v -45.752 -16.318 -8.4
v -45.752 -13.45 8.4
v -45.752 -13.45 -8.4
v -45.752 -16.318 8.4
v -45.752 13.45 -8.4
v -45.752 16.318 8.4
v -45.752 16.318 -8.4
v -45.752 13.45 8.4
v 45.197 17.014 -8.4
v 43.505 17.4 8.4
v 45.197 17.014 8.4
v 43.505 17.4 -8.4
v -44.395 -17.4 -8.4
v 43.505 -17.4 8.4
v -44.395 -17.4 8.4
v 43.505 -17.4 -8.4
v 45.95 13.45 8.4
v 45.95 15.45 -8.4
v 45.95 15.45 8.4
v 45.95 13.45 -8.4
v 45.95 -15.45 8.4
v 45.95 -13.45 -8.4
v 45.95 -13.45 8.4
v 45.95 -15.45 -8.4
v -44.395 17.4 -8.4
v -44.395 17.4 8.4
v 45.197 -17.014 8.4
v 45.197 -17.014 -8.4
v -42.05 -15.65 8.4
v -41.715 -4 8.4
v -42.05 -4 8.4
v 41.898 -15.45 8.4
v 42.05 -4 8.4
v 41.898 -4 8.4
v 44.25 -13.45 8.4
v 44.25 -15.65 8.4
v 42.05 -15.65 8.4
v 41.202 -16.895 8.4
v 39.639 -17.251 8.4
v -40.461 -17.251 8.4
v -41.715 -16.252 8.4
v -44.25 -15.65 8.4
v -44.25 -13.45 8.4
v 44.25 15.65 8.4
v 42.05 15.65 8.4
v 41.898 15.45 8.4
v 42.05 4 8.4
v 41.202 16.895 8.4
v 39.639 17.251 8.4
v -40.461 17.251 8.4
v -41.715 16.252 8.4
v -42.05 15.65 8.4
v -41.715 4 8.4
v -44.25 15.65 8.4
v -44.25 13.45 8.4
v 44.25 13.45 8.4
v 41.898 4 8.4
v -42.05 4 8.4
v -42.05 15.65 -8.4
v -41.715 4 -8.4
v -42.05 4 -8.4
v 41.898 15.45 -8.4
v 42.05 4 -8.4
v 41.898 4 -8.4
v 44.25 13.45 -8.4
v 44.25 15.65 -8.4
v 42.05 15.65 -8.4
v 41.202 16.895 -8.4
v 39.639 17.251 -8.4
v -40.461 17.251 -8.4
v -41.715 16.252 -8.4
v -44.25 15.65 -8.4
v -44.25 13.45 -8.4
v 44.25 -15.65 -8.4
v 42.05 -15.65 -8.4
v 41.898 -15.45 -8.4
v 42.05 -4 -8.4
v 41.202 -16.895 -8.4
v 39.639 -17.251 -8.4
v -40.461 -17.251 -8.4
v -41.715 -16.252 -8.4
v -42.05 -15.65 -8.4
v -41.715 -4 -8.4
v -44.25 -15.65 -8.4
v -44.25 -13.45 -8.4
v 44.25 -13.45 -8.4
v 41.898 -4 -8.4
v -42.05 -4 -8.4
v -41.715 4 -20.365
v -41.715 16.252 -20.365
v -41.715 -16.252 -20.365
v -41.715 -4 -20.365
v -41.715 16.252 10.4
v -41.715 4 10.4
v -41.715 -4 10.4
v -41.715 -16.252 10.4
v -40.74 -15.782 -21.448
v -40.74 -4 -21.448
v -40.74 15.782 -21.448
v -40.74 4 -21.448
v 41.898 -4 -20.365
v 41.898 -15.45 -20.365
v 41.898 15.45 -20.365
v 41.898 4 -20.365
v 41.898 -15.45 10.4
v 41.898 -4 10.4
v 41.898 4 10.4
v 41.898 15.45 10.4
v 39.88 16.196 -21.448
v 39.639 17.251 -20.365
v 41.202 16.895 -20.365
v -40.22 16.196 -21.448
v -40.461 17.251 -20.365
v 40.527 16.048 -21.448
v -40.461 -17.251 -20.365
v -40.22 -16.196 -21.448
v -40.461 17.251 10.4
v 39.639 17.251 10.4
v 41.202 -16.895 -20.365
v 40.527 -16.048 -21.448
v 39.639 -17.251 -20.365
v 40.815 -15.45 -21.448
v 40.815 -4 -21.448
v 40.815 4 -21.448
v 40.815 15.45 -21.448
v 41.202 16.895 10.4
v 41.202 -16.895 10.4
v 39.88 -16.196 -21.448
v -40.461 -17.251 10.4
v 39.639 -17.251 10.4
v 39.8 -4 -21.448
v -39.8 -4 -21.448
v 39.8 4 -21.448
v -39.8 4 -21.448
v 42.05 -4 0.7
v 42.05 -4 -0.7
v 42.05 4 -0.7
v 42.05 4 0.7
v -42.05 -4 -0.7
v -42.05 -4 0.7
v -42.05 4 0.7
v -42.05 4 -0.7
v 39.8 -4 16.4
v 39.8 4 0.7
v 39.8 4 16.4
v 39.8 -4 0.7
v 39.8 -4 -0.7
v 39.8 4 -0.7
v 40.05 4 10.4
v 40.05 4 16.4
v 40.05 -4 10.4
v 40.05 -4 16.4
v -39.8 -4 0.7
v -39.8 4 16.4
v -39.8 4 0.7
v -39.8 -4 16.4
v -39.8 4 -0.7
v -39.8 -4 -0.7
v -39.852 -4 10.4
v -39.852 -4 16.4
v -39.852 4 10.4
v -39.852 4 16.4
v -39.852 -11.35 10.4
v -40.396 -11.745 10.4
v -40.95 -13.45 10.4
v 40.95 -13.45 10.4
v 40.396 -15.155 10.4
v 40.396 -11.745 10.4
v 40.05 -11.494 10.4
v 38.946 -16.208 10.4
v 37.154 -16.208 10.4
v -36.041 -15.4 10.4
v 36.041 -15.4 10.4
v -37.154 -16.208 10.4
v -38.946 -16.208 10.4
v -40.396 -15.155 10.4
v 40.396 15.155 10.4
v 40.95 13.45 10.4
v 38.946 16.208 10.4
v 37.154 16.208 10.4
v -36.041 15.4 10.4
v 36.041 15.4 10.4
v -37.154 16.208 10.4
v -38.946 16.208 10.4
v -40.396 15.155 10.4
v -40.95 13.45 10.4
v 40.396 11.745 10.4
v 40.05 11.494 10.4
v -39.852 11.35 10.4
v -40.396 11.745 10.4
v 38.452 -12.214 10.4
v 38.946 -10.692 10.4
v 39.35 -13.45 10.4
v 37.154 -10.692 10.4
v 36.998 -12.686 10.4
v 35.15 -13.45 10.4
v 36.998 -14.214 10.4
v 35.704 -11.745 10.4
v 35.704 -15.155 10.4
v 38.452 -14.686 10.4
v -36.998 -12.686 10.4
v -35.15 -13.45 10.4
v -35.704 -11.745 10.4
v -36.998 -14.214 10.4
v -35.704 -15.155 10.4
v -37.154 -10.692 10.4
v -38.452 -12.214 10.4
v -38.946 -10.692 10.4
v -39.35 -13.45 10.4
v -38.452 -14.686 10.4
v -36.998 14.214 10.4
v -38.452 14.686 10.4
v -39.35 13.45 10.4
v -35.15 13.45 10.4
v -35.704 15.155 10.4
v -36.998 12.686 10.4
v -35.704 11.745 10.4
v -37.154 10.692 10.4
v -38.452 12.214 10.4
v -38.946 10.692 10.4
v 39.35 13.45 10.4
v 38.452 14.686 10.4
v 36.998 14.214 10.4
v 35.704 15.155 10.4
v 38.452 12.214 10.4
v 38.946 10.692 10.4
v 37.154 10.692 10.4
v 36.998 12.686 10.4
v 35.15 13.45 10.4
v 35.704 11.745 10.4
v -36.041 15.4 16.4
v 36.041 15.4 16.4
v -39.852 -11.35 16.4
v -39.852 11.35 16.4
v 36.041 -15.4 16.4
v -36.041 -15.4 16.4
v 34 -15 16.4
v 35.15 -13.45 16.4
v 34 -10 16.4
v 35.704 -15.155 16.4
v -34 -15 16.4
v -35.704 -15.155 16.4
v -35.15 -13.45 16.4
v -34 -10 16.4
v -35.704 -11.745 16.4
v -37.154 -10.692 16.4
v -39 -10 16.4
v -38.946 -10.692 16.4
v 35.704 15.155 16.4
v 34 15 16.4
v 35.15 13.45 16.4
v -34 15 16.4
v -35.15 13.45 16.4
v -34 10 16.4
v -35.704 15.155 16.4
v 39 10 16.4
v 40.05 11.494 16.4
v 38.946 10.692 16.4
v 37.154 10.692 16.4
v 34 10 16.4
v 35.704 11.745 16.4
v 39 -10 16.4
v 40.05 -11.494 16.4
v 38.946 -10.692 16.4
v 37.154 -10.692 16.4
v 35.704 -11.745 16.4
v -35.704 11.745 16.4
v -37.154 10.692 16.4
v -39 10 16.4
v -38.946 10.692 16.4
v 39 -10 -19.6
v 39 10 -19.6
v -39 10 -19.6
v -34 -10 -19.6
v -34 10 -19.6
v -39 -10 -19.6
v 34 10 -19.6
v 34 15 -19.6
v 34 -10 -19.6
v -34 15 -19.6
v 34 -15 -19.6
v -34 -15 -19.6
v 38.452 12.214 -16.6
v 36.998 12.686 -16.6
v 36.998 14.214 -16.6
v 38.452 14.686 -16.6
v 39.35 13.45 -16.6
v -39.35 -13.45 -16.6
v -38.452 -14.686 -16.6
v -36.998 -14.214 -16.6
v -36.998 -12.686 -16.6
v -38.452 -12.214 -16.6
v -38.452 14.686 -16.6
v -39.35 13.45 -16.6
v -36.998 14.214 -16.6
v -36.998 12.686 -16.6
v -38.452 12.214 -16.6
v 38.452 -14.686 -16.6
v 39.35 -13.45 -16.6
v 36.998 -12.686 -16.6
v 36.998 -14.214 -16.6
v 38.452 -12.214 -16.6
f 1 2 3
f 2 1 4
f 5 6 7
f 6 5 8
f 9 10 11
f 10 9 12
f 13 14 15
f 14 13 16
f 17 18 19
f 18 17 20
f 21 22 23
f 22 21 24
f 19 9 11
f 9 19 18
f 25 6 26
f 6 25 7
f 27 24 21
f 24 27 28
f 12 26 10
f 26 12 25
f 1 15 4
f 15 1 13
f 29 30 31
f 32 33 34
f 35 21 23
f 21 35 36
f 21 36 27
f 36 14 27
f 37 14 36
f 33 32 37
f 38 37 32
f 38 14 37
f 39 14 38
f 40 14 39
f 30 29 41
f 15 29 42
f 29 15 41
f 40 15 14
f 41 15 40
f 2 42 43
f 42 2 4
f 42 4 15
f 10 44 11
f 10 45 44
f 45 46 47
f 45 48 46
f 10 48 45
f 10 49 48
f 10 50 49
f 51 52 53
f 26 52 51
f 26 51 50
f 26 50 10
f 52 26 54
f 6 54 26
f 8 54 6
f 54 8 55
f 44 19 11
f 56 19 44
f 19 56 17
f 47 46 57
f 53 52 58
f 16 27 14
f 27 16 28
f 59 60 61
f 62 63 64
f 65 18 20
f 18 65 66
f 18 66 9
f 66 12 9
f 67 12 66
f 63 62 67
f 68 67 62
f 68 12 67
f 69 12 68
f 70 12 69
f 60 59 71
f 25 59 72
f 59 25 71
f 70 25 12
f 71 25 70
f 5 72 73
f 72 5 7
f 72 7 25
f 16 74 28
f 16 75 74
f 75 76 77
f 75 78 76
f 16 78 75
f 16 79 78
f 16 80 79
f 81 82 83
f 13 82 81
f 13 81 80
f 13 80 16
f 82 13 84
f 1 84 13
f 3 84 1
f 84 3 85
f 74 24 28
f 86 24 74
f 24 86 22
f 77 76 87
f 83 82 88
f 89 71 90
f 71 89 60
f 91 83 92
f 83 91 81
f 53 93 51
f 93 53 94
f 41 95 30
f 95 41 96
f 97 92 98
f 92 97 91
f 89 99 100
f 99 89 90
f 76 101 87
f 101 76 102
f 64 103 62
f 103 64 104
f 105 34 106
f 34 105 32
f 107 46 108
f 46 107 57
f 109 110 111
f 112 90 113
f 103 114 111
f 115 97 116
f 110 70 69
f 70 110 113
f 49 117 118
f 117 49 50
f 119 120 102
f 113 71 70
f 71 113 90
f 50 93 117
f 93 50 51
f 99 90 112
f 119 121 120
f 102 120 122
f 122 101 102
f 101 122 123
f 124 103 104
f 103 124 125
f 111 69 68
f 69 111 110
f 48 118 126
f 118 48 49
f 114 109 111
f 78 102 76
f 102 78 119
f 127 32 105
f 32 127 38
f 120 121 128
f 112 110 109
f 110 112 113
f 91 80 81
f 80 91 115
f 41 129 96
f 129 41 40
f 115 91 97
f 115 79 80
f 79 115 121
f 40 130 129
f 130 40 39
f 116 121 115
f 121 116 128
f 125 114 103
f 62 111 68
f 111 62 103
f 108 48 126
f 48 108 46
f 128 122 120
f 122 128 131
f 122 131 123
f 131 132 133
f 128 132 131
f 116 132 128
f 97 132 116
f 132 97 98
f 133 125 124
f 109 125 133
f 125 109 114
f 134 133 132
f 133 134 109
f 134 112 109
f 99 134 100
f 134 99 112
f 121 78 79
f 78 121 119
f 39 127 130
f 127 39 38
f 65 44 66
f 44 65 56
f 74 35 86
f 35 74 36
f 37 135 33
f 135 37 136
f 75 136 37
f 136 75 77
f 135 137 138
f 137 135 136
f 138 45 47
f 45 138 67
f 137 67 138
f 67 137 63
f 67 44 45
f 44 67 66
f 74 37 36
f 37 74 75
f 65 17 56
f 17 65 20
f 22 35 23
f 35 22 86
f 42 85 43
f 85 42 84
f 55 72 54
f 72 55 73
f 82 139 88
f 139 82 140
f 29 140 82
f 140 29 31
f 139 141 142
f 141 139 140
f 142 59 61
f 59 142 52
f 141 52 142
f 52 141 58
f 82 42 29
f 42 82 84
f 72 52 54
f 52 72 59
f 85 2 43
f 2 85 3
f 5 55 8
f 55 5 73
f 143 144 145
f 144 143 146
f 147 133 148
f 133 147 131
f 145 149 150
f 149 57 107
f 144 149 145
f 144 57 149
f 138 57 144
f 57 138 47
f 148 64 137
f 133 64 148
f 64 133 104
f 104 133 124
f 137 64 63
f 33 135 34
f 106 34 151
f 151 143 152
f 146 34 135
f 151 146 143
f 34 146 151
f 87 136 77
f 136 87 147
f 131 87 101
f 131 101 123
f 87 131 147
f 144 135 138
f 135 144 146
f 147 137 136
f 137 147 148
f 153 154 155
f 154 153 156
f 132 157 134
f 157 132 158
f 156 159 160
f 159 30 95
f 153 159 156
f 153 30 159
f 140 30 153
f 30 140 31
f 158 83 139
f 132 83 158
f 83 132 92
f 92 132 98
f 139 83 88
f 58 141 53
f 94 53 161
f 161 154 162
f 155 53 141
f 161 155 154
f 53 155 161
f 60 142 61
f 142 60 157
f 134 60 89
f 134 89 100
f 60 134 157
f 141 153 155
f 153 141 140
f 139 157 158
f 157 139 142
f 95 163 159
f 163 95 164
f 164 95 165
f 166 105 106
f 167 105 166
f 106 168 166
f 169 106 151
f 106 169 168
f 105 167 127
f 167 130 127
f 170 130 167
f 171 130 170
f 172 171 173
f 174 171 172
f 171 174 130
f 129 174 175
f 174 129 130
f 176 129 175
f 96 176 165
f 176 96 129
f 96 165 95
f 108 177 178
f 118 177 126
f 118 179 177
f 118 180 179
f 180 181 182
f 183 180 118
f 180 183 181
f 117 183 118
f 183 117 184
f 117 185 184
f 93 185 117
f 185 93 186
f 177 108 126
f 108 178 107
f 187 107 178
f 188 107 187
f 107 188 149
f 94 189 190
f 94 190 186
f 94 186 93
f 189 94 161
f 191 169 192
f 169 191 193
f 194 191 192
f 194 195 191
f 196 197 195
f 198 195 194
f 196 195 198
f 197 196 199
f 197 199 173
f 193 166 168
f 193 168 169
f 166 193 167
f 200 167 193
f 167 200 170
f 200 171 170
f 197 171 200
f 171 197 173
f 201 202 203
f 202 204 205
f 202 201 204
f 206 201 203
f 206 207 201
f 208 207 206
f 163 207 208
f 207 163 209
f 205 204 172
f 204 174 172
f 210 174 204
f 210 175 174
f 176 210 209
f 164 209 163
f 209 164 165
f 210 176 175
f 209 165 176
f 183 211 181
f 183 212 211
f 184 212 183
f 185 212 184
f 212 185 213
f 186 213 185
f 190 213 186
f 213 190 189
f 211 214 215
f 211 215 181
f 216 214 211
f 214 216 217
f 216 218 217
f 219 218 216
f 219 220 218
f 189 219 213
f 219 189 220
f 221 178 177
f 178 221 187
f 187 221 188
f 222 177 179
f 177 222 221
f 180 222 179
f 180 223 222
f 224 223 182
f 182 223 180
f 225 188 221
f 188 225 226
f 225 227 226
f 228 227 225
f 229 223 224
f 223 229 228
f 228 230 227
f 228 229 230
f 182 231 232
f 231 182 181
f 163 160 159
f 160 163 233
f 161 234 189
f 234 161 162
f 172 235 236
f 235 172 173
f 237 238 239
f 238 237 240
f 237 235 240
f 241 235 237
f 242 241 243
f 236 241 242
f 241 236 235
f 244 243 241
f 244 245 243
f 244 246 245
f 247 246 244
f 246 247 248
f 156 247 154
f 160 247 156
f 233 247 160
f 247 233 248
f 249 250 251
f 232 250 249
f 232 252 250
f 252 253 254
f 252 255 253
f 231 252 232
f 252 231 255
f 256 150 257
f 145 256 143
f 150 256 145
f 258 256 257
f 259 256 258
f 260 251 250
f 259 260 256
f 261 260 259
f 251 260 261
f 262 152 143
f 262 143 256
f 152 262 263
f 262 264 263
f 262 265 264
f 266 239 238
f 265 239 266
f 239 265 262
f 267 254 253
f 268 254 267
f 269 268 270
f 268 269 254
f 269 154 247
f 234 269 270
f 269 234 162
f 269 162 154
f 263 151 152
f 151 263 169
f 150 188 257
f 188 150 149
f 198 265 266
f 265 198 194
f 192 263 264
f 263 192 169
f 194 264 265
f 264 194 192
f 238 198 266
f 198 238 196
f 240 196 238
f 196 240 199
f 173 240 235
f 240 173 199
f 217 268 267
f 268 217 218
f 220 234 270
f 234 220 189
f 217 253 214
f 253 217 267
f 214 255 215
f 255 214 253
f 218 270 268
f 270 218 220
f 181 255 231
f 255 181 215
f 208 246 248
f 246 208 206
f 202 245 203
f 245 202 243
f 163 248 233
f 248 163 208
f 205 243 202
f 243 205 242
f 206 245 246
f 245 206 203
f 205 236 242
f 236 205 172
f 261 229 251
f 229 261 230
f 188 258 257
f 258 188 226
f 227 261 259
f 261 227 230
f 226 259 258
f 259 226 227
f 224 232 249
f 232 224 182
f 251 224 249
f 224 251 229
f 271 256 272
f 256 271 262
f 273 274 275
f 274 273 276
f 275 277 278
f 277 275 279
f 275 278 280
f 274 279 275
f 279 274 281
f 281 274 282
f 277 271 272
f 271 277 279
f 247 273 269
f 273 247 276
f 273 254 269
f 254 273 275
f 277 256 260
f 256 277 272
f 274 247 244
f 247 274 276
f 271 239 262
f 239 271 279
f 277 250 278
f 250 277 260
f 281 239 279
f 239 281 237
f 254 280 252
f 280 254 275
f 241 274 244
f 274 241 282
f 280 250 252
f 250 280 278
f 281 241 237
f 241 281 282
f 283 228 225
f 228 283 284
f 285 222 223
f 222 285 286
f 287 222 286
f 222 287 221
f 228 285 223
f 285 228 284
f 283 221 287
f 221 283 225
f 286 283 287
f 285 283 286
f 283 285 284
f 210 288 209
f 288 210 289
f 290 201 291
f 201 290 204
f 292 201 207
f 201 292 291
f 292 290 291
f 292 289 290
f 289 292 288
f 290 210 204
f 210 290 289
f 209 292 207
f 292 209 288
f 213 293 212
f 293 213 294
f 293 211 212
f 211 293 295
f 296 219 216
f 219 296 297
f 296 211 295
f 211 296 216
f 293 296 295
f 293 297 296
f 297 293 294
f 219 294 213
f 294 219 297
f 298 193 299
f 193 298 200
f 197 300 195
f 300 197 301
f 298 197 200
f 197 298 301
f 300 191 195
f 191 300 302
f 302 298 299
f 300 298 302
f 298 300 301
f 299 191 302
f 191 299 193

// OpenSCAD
/*********************************************************************
 *                                                                   *
 *                     Auto-Electrical Modules                       *
 *                     =======================                       *
 *                                                                   *
 * Author: Steve Morgan                                              *
 * Project Source: https://github.com/smorgo/Auto-Electrical-Modules *
 *                                                                   *
 * License: Creative Commons - Attribution - Non Commercial          *
 *                                                                   *
 * 3D printable designs for a suite of modular components to create  *
 * auto-electrical installations.                                    *
 *                                                                   *
 * The printable components in this project are intended to be       *
 * compatible with the MTA Modular Fuse Holder System                *
* (http://www.mta.it/en/frames-modules). The MTA Modular Fuse Holder *
* System is available in the UK from such vendors as 12VoltPlanet    *
* and Polevolt.                                                      *
*                                                                    *
* For more detailed information, see the GitHub project (link above).*
*                                                                    *
**********************************************************************

// Quality setting. You might want to temporarily reduce this for testing
$fn = 30; 

/* This file can be used to generate a number of different components.
 * Set the switches to true or false to control which are generated 
 * and which are not. I recommend that, for generating an STL, you
 * only have one set to true at a time, as they aren't guaranteed
 * to lie in the same vertical plane, making printing difficult,
 * if not impossible. */
 
 /* [Select Demo mode or Printable Parts] */
 // Set to true to see an 'assembly' of parts
demo = 0; // [0:false, 1:true]

/* [Parts to Generate] */
// Set to true to generate an enclosure lid
make_lid = 0; // [0:false, 1:true]             
// Set to true to generate an enclosure (without the lid)
make_body = 1; // [0:false, 1:true]
// Set to true to generate a mounting bracket (set number_of_ways, too)
make_mount = 0; // [0:false, 1:true]           
// Number of 'modules' wide to make the mounting bracket (when make_mount=true)
number_of_ways = 3;           
// Set to true to generate a locking piece for the mounting brackets
make_lock = 0; // [0:false, 1:true]            
// Set to true to generate a spacer that fits under an MTA 2-way bracket to allow surface mounting. Note that brackets made using make_mount=true don't need this spacer
make_standoff = 0; // [0:false, 1:true]
// Set to true to generate a PCB holder. Note that this is specific to my application. You'll want to modify the pcb_insert() module to make your own
make_insert = 0; // [0:false, 1:true]
// Puts a row of four holes in an enclosure. Specific to my application
include_wire_holes = 0; // [0:false, 1:true]

// Some commonly used settings
// Sets the overall height of the enclosure (when make_body=true)
module_height = 40;           
// How much space to allow under the enclosure (with the generated brackets. Adjust for the MTA ones)
module_under_clearance = 2;   
// Depth of the enclosure lid (when make_body=true or make_lid=true)
lid_depth = 9;                
// Overall height of the standoff (when make_standoff=true). Add 2mm to the amount you want to raise the MTA bracket
standoff_height = 12;         

/*===============================================================*/

/*************************************************************
 *                                                           *
 * Some useful notes                                         *
 *                                                           *
 * The enclosure and lid are designed to use M2 countersunk  *
 * machine screws for fixing and M2 heat inserts in the body *
 * of the enclosure, inserted with a hot soldering iron.     *
 * If you want to do something different, you may need to    *
 * change some of the screw-related settings.                *
 *                                                           *
 *************************************************************/
body_screw_diameter = 2.6; // Hole in the enclosure for the heat insert. This should probably be a bit bigger, but it's worked for me.
lid_screw_diameter = 2.2; // Allow a little clearance.
lid_screw_head_diameter = 3.6;
lid_screw_head_depth = 2;
lid_screw_recess = 0.5;

/* You probably don't need to change these settings, as they're tested for compatibility with
 * the MTA modular system. */
/* [Hidden] */
module_width = 34.9;
module_inner_length = 84.1;
module_outer_length = 91.9;
module_radius = 2;
slide_depth = 16.8;
slide_notch_thickness = 2.2;
slide_notch_wall_width = 1.8;
slide_radius = 2;
slide_width = 4;
lock_channel_width = 8;
lock_height = 8.4; // relative to slide
lock_thickness = 1.4;
lock_depth = 2.2;
lid_clearance = 1;
lid_wall_thickness = 2;
lid_inner_radius = 2;
internal_width = 30;
internal_length = 78;
mount_width = 39.6;
mount_height = 32;
mount_length = 10;
mount_radius = 3;
mount_wall_thickness = 2;
mount_clip_body_width = 24.4;
mount_clip_body_thickness = 2.1;
mount_clip_front_width = 30.8;
mount_clip_front_thickness = 1.6;
mount_slot_width = 10.4;
fixing_outer_diameter = 10;
fixing_inner_diameter = 4;
fixing_depth = 4;

module_z_offset = (mount_height - module_height)/-2 + (slide_depth - mount_height)/2 + module_under_clearance;
lid_z_offset = (module_z_offset + module_height/2 - lid_depth);

if(demo) {
    demo(2);
} else {
    main();
}

module demo(num=3) {
    make_boxes(num);
    make_mounts(num);
    make_locks(num);
    make_standoffs();
    translate([0,(num-1) * (mount_width - mount_wall_thickness),0]) {
        rotate([0,0,180]) {
            make_mounts(num);
            make_locks(num);
        }
        translate([0,0,-10]) {
            pcb_insert(true);
        }
    }
}

module main() {

    if(make_body) {
        body();
    }
    
    if(make_lid) {
        translate([0,80,0]) {
            difference() {
                lid();
                lid_screws();
            }
        }
    }

    if(make_mount) {
        translate([80,0,0]) {
            difference() {
                for(i=[0:number_of_ways -1]) {
                    translate([0,i * (mount_width - mount_wall_thickness),0]) {
                        mount();
                    }
                }
                if(number_of_ways > 1) {
                    for(i=[1:number_of_ways -1]) {
                        translate([-6,(i - 0.5) * (mount_width - mount_wall_thickness),0]) {
                            cube([4,mount_wall_thickness + 1,mount_height +1], center=true);
                        }
                    }
                }
            }
            mount_fixings();
        }
    }

    if(make_lock) {
        translate([-50,-100,0]) {
            rotate([90,0,0]) slide_lock();
        }
    }
    
    if(make_insert) {
        translate([20,-50,-20]) {
            pcb_insert();
        }
    }
    
    if(make_standoff) {
        translate([120,0,0]) {
            standoff();
        }
    }
}

/************************************************
 *                                              *
 * The implementations. In general, don't mess  *
 * with these (with the exception of pcb_insert *
 * and wire_holes, if you need to).             *
 *                                              *
 ************************************************/
module body() {

    difference() {
        union() {
            roundedcube([module_outer_length, module_width, slide_depth], center=true, radius=slide_radius, apply_to="z");
            translate([0,0,module_z_offset]) {
                roundedcube([module_inner_length, module_width, module_height], center=true, radius=module_radius);
            }
        }
        slots();
        locks();
        translate([0,0,module_height/2 + module_z_offset]) rotate([180,0,0]) lid(depth = lid_depth-lid_clearance,clearance = 0.2);
        translate([0,0,lid_wall_thickness + module_z_offset]) {
            cube([internal_length, internal_width - 10, module_height], center=true);
            cube([internal_length - 10, internal_width, module_height], center=true);
        }
        body_screws();
        if(include_wire_holes) {
            wire_holes();
        }
    }
}

module body_screw() {
    translate([module_inner_length/2 - 4, module_width/2 - 4,(lid_depth+lid_clearance)/2+module_z_offset]) {
        cylinder(h = module_height, d = body_screw_diameter, center=true);
    }
}

module body_screws() {
    body_screw();
    rotate([0,0,180]) body_screw();
    mirror([1,0,0]) body_screw();
    mirror([1,0,0]) rotate([0,0,180]) body_screw();
}

module lid(depth = lid_depth, clearance = 0) {
    
    mirror([0,0,1]) {
        translate([0,0,-module_height/2]) {
            difference() {
                translate([0,0,clearance/2]) {
                    roundedcube([module_inner_length + clearance, module_width + clearance, module_height + clearance], center=true, radius=slide_radius);
                }
                translate([0,0,-depth]) {
                    cube([module_inner_length+1, module_width+1, module_height], center=true);
                }
                translate([0,0,-lid_wall_thickness]) {
                    roundedcube([module_inner_length - 2 * lid_wall_thickness, module_width - 2 * lid_wall_thickness, module_height], center=true, radius=lid_inner_radius, apply_to="z");
                }
            }
        }
        lid_posts(depth,clearance);
    }
}

module lid_post(depth,clearance) {
    translate([module_inner_length/2 - 4, module_width/2 - 4,-depth/2]) {
        cylinder(h = depth, d = 6 - clearance, center=true);
    }
}

module lid_posts(depth,clearance) {
    lid_post(depth,clearance);
    rotate([0,0,180]) lid_post(depth,clearance);
    mirror([1,0,0]) lid_post(depth,clearance);
    mirror([1,0,0]) rotate([0,0,180]) lid_post(depth,clearance);
}

module lid_screw() {
    translate([module_inner_length/2 - 4, module_width/2 - 4, -0.6]) {
        mirror([0,0,1]) {
            screw_countersunk(l = lid_depth+0.2,dh=lid_screw_head_diameter,lh=lid_screw_head_depth,ds=lid_screw_diameter,recess=lid_screw_recess);
        }
    }
}

module lid_screws() {
    lid_screw();
    rotate([0,0,180]) lid_screw();
    mirror([1,0,0]) lid_screw();
    mirror([1,0,0]) rotate([0,0,180]) lid_screw();
}

module lock() {
    translate([(module_inner_length - lock_depth)/2,0,0]) {
        difference() {
            translate([0,0,module_z_offset]) cube([lock_depth + 0.1,lock_channel_width, module_height+1], center=true);
            cube([lock_depth + 0.1, lock_channel_width + 0.1, lock_thickness], center=true);
        }
    }
}

module locks() {
    lock();
    rotate([0,0,180]) {
        lock();
    }
}

module make_box() {
    body();
    
    difference() {
        lid(depth = lid_depth-lid_clearance, clearance = 0.2);
        lid_screws();
    }
}

module make_boxes(num) {

    translate([0,0,(mount_height-slide_depth)/2]) {
        for(i=[0:num -1]) {
            translate([0,i * (mount_width - mount_wall_thickness),0]) {
                make_box();
            }
        }

        for(i=[0:num -1]) {
            translate([0,i * (mount_width - mount_wall_thickness),0]) {
                lid_offset = (i == num-1) ? 15:0;
                translate([0,0,lid_z_offset+lid_offset+lid_depth/2+3.2]) {
                    rotate([180,0,0]) {
                        difference() {
                            lid();
                            lid_screws();
                        }
                    }
                }
            }
        }
    }
}

module make_locks(num) {

    translate([module_inner_length/2,0,0]) {
        for(i=[0:num -1]) {
            translate([0,i * (mount_width - mount_wall_thickness),0]) {
                slide_lock();
            }
        }
    }
}

module make_mounts(num) {

    translate([module_inner_length/2 + 1,0,0]) {
        difference() {
            union() {
                for(i=[0:num -1]) {
                    translate([0,i * (mount_width - mount_wall_thickness),0]) {
                        mount();
                    }
                }   
                mount_fixings(num);
            }
        
            if(number_of_ways > 1) {
                for(i=[1:num -1]) {
                    translate([-6,(i - 0.5) * (mount_width - mount_wall_thickness),0]) {
                        cube([4,mount_wall_thickness + 1,mount_height +1], center=true);
                    }
                }
            }
        }
    }
}
    
module make_standoffs() {
    translate([0,-60,-10]) {
        rotate([0,0,90]) standoff(2);
        translate([-20,0,0]) rotate([0,0,-90]) standoff(2);
    }
}

module mount() {
    
    difference() {
        union() {
            difference() {
                roundedcube([mount_length, mount_width, mount_height], center=true, radius=mount_radius, apply_to="z");
                translate([-mount_wall_thickness,0,mount_height-slide_depth]) {
                    roundedcube([mount_length, mount_width - 2 * mount_wall_thickness, mount_height+1], center=true, radius=slide_radius, apply_to="z");
                }
                translate([-mount_wall_thickness-mount_clip_body_thickness-mount_clip_front_thickness,0,0]) {
                    cube([mount_length, mount_width - 2 * mount_wall_thickness, mount_height+1], center=true);
                }
            }

            translate([(mount_length-mount_clip_body_thickness)/2-mount_wall_thickness,0,0]) {
                cube([mount_clip_body_thickness + 0.6,mount_clip_body_width,mount_height], center=true);
                translate([-mount_clip_body_thickness,0,0]) {
                    cube([mount_clip_front_thickness,mount_clip_front_width,mount_height], center=true);
                }
            }
        }
        
        slide_lock(0.4);

        translate([mount_length/2-mount_wall_thickness-2,0,0]) {
            cube([2,6.4,mount_height - 4 * mount_wall_thickness], center=true);
        }

    }
}

module mount_fixing() {
    difference() {
        hull() {
            translate([4,0,5-mount_height/2]) {
                cube([0.5,20,10],center=true);
            }
            translate([12,0,(fixing_depth-mount_height)/2]) {
                cylinder(d = fixing_outer_diameter, h = fixing_depth, center=true);
            }
        }
        // `This cutout prevents the foot from overlapping the lock recess
        translate([4,0,-mount_height/2]) cube([4,6.4,4], center=true);
        translate([12,0,(fixing_depth-mount_height)/2]) {
            translate([0,0,fixing_depth+10]) {
                cylinder(d = fixing_outer_diameter, h = fixing_depth+20, center=true);
            }
                cylinder(d = fixing_inner_diameter, h = fixing_depth+0.1, center=true);
        }
    }
}

module mount_fixings(num = number_of_ways) {
    mount_fixing();
    if(num > 2) {
        offset = (num -1) * (mount_width - mount_wall_thickness);
        translate([0,offset,0]) {
            mount_fixing();
        }
    }
}

module pcb_insert(show_pcb = false) {
    clearance = 0.4;
    l = internal_length - clearance;
    w = internal_width - clearance;
    h = 2;
    pcb_l = 41.3;
    pcb_w = 19.3;
    pcb_h = 32.1;
    rla_l = 13.2;
    rla_w = 14.2;
    rla_h = 7;
    
    ox = 27.6;
    oy = 31.3;
    
    difference() {
        union() {
            cube([l, w - 10 - clearance, h], center=true);
            cube([l - 10, w, h], center=true);
        }
        cube([l - 6, w - 16 , h * 1.1], center=true);
        cube([l - 16, w - 6, h * 1.1], center=true);
    }
    cube([3,w,h], center=true);
    translate([-l/4,0,0]) cube([3,w,h], center=true);
    translate([l/4,0,0]) cube([3,w,h], center=true);
    translate([-l/8,-pcb_w/2+3,0]) cube([l/4,6,h], center=true);
    translate([-l/2+pcb_l+1,0,h/2]) cube([2,w,4], center=true);
    translate([-l/2+5,-pcb_w/2-3,-1]) {
        difference() {
            cube([pcb_l-5,3,pcb_h+h]);
            translate([pcb_l-ox,0,oy+h/2]) {
                rotate([90,0,0]) {              
                    cylinder(d=2,h=10, center=true);
                }
            }
        }
    }
    
    translate([-l/2+24,-pcb_w/2+3,0]) {
        cube([9,3,h+5]);
    }
    
    translate([-l/2+pcb_l+rla_l/2+2,0,rla_h/2]) {
        difference() {
            cube([rla_l+4,rla_w+4,rla_h+2], center=true);
            translate([0,0,2]) {
                cube([rla_l, rla_w, rla_h], center=true);
            }
        }
    }
    
    if(show_pcb) {
        /* PCB Placeholder */
        color("green",0.5) {
            translate([-l/2,-pcb_w/2,h/2]) {
                cube([pcb_l,pcb_w,pcb_h]);
            }
        }
    }
}

module slide_lock(clearance=0) {
    cube([2,6 + clearance,mount_height+0.02], center=true);
    translate([2.1,0,mount_height/2-1+0.04]) {
        cube([6,6 + clearance,2.08 + clearance/2], center=true);
    }
    translate([2.1,0,-mount_height/2+1-0.04]) { 
        cube([6,6 + clearance,2.08 + clearance/2], center=true);
    }
    translate([-1,-3,(mount_height - slide_depth)/2+3.5]) {
        rotate([-90,0,90]) {
            prism(6,2.5,1.4);
        }
    }
    translate([-1,3,(mount_height - slide_depth)/2-3.5]) {
        rotate([-90,180,90]) {
            prism(6,2.5,1.4);
        }
    }
}

module slot() {
    translate([module_inner_length/2 + slide_notch_thickness/2,0]) {
        cube([slide_notch_thickness, module_width - 2 * slide_notch_wall_width, slide_depth + 0.2], center=true);
        translate([(module_outer_length - module_inner_length)/2+0.1,0,0]) {
            cube([module_outer_length - module_inner_length,module_width - 2 * slide_width,slide_depth + 0.2], center=true);
        }
    }
}

module slots() {
    slot();
    rotate([0,0,180]) {
        slot();
    }
}

module standoff(ways = number_of_ways, h = standoff_height) {
    l1 = ways * mount_width - mount_wall_thickness + 0.5;
    l2 = l1 + 2 * mount_wall_thickness;
    w = 12 + 2 * mount_wall_thickness;

    difference() {
        lozenge([l2,w,h]);
        translate([0,-1,h-2]) {
            lozenge([l1,10,h]);
            cube([25,w+1,h], center=true);
            translate([23.3,0,0]) cube([6,w+1,h], center=true);
            translate([-23.3,0,0]) cube([6,w+1,h], center=true);
        }
        translate([0,w/2,0]) {
            cube([l2+1,w,h+1], center=true);
        }
    }
    
    translate([0,0,-1]) {
        difference() {
            hull() {
                translate([5,-12 - w/2,0]) {
                    cylinder(r=5,h=h-2,center=true);
                }
                translate([-5, -12 - w/2,0]) {
                    cylinder(r=5,h=h-2,center=true);
                }
                translate([0,-w/2,0]) {
                    cube([25,1,h-2], center=true);
                }
            }
            translate([0,-8 - w/2,0]) {
                cylinder(d=7,h=h,center=true);
            }
        }
    }
}

module wire_holes() {
    translate([-3,20,-15]) {
        rotate([90,0,0]) {
            cylinder(d=4,h=50,center=true);
        }
    }
    translate([-9,20,-15]) {
        rotate([90,0,0]) {
            cylinder(d=4,h=50,center=true);
        }
    }
    translate([-15,20,-15]) {
        rotate([90,0,0]) {
            cylinder(d=4,h=50,center=true);
        }
    }
    translate([-21,20,-15]) {
        rotate([90,0,0]) {
            cylinder(d=4,h=50,center=true);
        }
    }
    
}

/************************************************
 *                                              *
 * Utility functions                            *
 *                                              *
 ************************************************/

module lozenge(size=[0,0,0]) {
	size = (size[0] == undef) ? [size, size, size] : size;

    l = size[0];
    w = size[1];
    h = size[2];
    
    translate([-(l-w)/2,0,0]) {
        cylinder(d=w,h=h,center=true);
    }
    translate([(l-w)/2,0,0]) {
        cylinder(d=w,h=h,center=true);
    }
    cube([l-w,w,h], center=true);
}

module prism(l, w, h){
    polyhedron(
        points=[[0,0,0], [l,0,0], [l,w,0], [0,w,0], [0,w,h], [l,w,h]],
        faces=[[0,1,2,3],[5,4,3,2],[0,4,5,1],[0,3,4],[5,2,1]]
    );
}

// The roundedcube function, shamelessy lifted from:
// https://danielupshaw.com/openscad-rounded-corners/
module roundedcube(size = [1, 1, 1], center = false, radius = 0.5, apply_to = "all") {
	// If single value, convert to [x, y, z] vector
	size = (size[0] == undef) ? [size, size, size] : size;

	translate_min = radius;
	translate_xmax = size[0] - radius;
	translate_ymax = size[1] - radius;
	translate_zmax = size[2] - radius;

	diameter = radius * 2;

	module build_point(type = "sphere", rotate = [0, 0, 0]) {
		if (type == "sphere") {
			sphere(r = radius);
		} else if (type == "cylinder") {
			rotate(a = rotate)
			cylinder(h = diameter, r = radius, center = true);
		}
	}

	obj_translate = (center == false) ?
		[0, 0, 0] : [
			-(size[0] / 2),
			-(size[1] / 2),
			-(size[2] / 2)
		];

	translate(v = obj_translate) {
		hull() {
			for (translate_x = [translate_min, translate_xmax]) {
				x_at = (translate_x == translate_min) ? "min" : "max";
				for (translate_y = [translate_min, translate_ymax]) {
					y_at = (translate_y == translate_min) ? "min" : "max";
					for (translate_z = [translate_min, translate_zmax]) {
						z_at = (translate_z == translate_min) ? "min" : "max";

						translate(v = [translate_x, translate_y, translate_z])
						if (
							(apply_to == "all") ||
							(apply_to == "xmin" && x_at == "min") || (apply_to == "xmax" && x_at == "max") ||
							(apply_to == "ymin" && y_at == "min") || (apply_to == "ymax" && y_at == "max") ||
							(apply_to == "zmin" && z_at == "min") || (apply_to == "zmax" && z_at == "max")
						) {
							build_point("sphere");
						} else {
							rotate = 
								(apply_to == "xmin" || apply_to == "xmax" || apply_to == "x") ? [0, 90, 0] : (
								(apply_to == "ymin" || apply_to == "ymax" || apply_to == "y") ? [90, 90, 0] :
								[0, 0, 0]
							);
							build_point("cylinder", rotate);
						}
					}
				}
			}
		}
	}
}

// Initially taken from:
// https://gist.github.com/Stemer114/af8ef63b8d10287c825f
// However, I tweaked it slightly to allow for a counterbore.
module screw_countersunk(
        l=20,   //length
        dh = 6,   //head dia
        lh = 3,   //head length
        ds = 3.2,  //shaft dia
        recess = 0
        )
{
    rotate([180,0,0])
    union() {
        if(recess > 0) {
            cylinder(h=recess, d=dh);
        }
        translate([0,0,recess]) {
            cylinder(h=lh, r1=dh/2, r2=ds/2);
            cylinder(h=l, d=ds);
        }
    }
}
